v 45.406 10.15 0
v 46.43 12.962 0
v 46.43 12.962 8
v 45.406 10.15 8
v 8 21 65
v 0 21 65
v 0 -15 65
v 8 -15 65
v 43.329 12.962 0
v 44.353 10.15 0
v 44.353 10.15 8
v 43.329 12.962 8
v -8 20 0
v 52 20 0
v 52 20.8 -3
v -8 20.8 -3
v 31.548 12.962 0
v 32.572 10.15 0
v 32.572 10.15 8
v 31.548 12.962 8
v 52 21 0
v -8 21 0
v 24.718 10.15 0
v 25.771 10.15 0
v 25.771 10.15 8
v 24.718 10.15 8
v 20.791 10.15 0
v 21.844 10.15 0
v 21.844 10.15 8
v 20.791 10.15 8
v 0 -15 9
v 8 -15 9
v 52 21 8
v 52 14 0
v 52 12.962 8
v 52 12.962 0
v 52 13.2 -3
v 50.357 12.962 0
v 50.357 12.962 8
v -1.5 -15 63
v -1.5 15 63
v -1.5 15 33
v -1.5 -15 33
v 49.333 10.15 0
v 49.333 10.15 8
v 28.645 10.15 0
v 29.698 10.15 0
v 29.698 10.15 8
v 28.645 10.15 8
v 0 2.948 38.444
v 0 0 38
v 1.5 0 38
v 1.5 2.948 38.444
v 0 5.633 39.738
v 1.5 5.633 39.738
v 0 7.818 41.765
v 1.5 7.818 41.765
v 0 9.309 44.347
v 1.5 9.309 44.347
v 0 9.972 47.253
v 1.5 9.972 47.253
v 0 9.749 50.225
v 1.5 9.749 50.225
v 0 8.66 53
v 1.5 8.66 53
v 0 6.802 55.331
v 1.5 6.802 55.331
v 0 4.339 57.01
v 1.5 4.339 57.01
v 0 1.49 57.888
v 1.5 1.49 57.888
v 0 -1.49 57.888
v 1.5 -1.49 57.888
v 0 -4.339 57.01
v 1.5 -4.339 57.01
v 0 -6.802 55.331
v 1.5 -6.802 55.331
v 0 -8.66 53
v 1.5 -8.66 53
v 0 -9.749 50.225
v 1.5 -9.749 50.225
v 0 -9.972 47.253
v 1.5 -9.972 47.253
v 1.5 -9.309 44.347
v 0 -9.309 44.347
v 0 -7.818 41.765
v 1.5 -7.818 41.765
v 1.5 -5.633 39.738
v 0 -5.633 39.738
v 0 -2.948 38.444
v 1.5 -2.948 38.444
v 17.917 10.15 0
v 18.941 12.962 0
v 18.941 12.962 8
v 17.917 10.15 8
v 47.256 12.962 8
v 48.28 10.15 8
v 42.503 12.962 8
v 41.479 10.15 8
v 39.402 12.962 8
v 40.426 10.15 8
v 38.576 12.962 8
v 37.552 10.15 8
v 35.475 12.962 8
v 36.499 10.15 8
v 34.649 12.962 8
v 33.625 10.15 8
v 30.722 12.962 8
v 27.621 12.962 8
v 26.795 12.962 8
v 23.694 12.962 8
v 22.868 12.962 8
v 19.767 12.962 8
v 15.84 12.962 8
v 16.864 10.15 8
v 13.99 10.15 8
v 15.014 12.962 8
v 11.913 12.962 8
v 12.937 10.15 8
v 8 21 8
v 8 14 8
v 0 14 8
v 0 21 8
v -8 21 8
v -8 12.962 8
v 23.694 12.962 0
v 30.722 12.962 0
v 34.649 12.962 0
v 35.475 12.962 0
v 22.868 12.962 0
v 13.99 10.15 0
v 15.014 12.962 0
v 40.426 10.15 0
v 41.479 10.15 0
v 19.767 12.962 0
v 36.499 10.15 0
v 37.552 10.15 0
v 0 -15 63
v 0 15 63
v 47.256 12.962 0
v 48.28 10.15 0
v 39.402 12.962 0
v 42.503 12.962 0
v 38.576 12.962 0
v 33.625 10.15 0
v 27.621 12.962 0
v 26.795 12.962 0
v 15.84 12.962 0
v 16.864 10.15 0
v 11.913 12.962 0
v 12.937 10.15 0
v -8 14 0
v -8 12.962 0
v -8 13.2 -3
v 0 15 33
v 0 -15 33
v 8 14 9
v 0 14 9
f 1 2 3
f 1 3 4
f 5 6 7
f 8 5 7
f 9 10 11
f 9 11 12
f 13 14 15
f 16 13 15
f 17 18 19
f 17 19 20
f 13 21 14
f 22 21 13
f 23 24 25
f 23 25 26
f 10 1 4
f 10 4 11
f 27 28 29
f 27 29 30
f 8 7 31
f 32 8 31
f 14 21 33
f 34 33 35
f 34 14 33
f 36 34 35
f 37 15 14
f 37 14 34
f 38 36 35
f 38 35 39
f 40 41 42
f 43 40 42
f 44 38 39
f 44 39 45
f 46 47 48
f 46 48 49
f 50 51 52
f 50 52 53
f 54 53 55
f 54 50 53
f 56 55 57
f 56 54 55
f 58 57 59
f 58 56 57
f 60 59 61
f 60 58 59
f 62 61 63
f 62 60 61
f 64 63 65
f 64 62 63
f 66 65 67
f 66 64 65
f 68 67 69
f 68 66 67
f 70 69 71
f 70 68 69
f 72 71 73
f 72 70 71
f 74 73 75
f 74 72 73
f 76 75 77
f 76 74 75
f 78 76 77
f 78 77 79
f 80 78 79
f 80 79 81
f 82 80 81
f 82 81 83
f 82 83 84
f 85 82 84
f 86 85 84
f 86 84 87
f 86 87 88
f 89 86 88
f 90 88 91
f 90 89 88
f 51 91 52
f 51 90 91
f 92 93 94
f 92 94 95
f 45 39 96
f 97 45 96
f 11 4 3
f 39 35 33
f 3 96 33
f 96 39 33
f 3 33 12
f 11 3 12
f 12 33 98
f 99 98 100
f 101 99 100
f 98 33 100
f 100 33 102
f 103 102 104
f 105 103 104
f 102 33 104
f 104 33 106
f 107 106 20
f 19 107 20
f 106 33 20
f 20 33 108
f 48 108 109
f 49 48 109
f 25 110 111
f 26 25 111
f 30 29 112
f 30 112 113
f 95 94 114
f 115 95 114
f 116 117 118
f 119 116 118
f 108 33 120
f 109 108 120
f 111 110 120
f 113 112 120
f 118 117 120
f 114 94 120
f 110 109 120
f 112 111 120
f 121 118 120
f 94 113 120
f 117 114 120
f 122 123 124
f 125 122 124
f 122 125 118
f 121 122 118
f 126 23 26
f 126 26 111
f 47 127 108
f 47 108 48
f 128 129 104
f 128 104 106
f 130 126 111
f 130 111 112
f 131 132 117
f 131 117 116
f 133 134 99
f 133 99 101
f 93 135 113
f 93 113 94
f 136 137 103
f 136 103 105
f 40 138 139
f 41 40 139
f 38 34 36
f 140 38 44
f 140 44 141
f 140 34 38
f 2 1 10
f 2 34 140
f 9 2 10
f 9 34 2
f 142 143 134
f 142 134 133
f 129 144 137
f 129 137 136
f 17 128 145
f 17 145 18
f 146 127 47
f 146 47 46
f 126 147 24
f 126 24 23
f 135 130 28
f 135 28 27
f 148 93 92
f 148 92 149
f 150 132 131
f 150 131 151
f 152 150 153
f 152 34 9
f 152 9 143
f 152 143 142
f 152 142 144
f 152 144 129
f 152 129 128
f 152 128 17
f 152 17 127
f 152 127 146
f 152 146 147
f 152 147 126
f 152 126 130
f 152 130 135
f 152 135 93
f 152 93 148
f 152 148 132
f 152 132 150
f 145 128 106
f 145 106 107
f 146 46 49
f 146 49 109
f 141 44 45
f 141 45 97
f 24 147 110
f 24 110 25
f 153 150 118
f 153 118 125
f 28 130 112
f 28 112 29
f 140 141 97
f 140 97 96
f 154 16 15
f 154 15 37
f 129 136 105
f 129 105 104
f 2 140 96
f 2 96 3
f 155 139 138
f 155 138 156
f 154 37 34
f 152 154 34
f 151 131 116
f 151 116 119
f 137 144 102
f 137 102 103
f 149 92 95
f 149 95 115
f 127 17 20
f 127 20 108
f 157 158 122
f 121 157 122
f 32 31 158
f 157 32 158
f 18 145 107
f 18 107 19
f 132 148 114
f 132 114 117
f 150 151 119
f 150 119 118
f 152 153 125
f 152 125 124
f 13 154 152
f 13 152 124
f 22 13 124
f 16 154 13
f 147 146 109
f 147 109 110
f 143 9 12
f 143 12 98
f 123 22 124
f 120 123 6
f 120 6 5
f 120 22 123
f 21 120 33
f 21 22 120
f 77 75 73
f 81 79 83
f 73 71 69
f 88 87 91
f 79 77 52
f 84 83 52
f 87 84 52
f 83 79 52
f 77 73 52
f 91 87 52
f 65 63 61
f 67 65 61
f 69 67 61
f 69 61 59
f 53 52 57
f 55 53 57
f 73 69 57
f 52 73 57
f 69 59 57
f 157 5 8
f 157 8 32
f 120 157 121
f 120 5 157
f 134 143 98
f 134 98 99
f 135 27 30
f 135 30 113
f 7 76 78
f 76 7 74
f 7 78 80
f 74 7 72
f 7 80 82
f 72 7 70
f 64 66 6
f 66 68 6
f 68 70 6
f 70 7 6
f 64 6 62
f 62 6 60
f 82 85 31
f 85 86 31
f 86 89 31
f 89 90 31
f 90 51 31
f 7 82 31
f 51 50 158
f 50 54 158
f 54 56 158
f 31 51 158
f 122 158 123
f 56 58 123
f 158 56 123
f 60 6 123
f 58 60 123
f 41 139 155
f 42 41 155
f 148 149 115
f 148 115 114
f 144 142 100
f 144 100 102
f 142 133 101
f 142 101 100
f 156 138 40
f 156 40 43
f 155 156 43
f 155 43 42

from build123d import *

# Parameters (mm, degrees)
RACK_BODY_8MM_DEPTH             = 8
FINGER_ARM_8MM_DEPTH            = 8
DOVETAIL_TONGUE_52_8_DEPTH      = 52
DOVETAIL_TONGUE_52_8_DEPTH_BACK = 8
SENSOR_POCKET_PLACEHOLDER_R     = 10
SENSOR_POCKET_CUT_DEPTH         = 1.5
NEOPRENED_PAD_SKETCH_W          = 30
NEOPRENED_PAD_SKETCH_H          = 30
NEOPRENE_PAD_NOT_PRINTED_DEPTH  = 1.5


with BuildPart() as part:
    # Rack profile m1.25 → Rack body 8mm (new body)
    with BuildSketch(Plane.XY):
        Polygon((-8, 21), (52, 21), (52, 12.9625), (50.356863957, 12.9625), (49.333197673, 10.15), (48.27962785, 10.15), (47.255961566, 12.9625), (46.42987314, 12.9625), (45.406206856, 10.15), (44.352637033, 10.15), (43.328970749, 12.9625), (42.502882323, 12.9625), (41.479216039, 10.15), (40.425646216, 10.15), (39.401979932, 12.9625), (38.575891506, 12.9625), (37.552225222, 10.15), (36.498655399, 10.15), (35.474989115, 12.9625), (34.648900689, 12.9625), (33.625234405, 10.15), (32.571664582, 10.15), (31.547998298, 12.9625), (30.721909872, 12.9625), (29.698243588, 10.15), (28.644673765, 10.15), (27.621007481, 12.9625), (26.794919055, 12.9625), (25.771252771, 10.15), (24.717682948, 10.15), (23.694016664, 12.9625), (22.867928238, 12.9625), (21.844261954, 10.15), (20.790692131, 10.15), (19.767025847, 12.9625), (18.940937421, 12.9625), (17.917271137, 10.15), (16.863701314, 10.15), (15.84003503, 12.9625), (15.013946604, 12.9625), (13.99028032, 10.15), (12.936710497, 10.15), (11.913044213, 12.9625), (-8, 12.9625), align=None)
    extrude(amount=RACK_BODY_8MM_DEPTH)

    # Finger Arm Profile → Finger arm 8mm (add)
    with BuildSketch(Plane(origin=(0, 0, 0), x_dir=(0, 0, -1), z_dir=(1, 0, 0))):
        Polygon((-2, 21), (-65, 21), (-65, -15), (-9, -15), (-9, 14), (-2, 14), align=None)
    extrude(amount=FINGER_ARM_8MM_DEPTH)

    # Dovetail Tongue → Dovetail Tongue 52 + 8 (add, two sides: drawn at the far end of the back side and taken through both)
    with BuildSketch(Plane(origin=(0, 0, 0), x_dir=(0, 0, -1), z_dir=(1, 0, 0)).offset(-DOVETAIL_TONGUE_52_8_DEPTH_BACK)):
        Polygon((0, 14), (0, 20), (3, 20.8), (3, 13.2), align=None)
    extrude(amount=DOVETAIL_TONGUE_52_8_DEPTH + DOVETAIL_TONGUE_52_8_DEPTH_BACK)

    # Sensor Pocket Placeholder → Sensor Pocket Cut (cut)
    with BuildSketch(Plane(origin=(0, 0, 0), x_dir=(0, 0, -1), z_dir=(1, 0, 0))):
        with Locations((-48, 0)):
            Circle(SENSOR_POCKET_PLACEHOLDER_R)
    extrude(amount=SENSOR_POCKET_CUT_DEPTH, mode=Mode.SUBTRACT)


with BuildPart() as body_2:
    # Neoprened pad sketch → Neoprene pad (not printed) (new body)
    with BuildSketch(Plane(origin=(0, 0, 0), x_dir=(0, 0, -1), z_dir=(1, 0, 0))):
        with Locations((-48, 0)):
            Rectangle(NEOPRENED_PAD_SKETCH_W, NEOPRENED_PAD_SKETCH_H)
    extrude(amount=-NEOPRENE_PAD_NOT_PRINTED_DEPTH)


solid = Compound([part.part, body_2.part])
